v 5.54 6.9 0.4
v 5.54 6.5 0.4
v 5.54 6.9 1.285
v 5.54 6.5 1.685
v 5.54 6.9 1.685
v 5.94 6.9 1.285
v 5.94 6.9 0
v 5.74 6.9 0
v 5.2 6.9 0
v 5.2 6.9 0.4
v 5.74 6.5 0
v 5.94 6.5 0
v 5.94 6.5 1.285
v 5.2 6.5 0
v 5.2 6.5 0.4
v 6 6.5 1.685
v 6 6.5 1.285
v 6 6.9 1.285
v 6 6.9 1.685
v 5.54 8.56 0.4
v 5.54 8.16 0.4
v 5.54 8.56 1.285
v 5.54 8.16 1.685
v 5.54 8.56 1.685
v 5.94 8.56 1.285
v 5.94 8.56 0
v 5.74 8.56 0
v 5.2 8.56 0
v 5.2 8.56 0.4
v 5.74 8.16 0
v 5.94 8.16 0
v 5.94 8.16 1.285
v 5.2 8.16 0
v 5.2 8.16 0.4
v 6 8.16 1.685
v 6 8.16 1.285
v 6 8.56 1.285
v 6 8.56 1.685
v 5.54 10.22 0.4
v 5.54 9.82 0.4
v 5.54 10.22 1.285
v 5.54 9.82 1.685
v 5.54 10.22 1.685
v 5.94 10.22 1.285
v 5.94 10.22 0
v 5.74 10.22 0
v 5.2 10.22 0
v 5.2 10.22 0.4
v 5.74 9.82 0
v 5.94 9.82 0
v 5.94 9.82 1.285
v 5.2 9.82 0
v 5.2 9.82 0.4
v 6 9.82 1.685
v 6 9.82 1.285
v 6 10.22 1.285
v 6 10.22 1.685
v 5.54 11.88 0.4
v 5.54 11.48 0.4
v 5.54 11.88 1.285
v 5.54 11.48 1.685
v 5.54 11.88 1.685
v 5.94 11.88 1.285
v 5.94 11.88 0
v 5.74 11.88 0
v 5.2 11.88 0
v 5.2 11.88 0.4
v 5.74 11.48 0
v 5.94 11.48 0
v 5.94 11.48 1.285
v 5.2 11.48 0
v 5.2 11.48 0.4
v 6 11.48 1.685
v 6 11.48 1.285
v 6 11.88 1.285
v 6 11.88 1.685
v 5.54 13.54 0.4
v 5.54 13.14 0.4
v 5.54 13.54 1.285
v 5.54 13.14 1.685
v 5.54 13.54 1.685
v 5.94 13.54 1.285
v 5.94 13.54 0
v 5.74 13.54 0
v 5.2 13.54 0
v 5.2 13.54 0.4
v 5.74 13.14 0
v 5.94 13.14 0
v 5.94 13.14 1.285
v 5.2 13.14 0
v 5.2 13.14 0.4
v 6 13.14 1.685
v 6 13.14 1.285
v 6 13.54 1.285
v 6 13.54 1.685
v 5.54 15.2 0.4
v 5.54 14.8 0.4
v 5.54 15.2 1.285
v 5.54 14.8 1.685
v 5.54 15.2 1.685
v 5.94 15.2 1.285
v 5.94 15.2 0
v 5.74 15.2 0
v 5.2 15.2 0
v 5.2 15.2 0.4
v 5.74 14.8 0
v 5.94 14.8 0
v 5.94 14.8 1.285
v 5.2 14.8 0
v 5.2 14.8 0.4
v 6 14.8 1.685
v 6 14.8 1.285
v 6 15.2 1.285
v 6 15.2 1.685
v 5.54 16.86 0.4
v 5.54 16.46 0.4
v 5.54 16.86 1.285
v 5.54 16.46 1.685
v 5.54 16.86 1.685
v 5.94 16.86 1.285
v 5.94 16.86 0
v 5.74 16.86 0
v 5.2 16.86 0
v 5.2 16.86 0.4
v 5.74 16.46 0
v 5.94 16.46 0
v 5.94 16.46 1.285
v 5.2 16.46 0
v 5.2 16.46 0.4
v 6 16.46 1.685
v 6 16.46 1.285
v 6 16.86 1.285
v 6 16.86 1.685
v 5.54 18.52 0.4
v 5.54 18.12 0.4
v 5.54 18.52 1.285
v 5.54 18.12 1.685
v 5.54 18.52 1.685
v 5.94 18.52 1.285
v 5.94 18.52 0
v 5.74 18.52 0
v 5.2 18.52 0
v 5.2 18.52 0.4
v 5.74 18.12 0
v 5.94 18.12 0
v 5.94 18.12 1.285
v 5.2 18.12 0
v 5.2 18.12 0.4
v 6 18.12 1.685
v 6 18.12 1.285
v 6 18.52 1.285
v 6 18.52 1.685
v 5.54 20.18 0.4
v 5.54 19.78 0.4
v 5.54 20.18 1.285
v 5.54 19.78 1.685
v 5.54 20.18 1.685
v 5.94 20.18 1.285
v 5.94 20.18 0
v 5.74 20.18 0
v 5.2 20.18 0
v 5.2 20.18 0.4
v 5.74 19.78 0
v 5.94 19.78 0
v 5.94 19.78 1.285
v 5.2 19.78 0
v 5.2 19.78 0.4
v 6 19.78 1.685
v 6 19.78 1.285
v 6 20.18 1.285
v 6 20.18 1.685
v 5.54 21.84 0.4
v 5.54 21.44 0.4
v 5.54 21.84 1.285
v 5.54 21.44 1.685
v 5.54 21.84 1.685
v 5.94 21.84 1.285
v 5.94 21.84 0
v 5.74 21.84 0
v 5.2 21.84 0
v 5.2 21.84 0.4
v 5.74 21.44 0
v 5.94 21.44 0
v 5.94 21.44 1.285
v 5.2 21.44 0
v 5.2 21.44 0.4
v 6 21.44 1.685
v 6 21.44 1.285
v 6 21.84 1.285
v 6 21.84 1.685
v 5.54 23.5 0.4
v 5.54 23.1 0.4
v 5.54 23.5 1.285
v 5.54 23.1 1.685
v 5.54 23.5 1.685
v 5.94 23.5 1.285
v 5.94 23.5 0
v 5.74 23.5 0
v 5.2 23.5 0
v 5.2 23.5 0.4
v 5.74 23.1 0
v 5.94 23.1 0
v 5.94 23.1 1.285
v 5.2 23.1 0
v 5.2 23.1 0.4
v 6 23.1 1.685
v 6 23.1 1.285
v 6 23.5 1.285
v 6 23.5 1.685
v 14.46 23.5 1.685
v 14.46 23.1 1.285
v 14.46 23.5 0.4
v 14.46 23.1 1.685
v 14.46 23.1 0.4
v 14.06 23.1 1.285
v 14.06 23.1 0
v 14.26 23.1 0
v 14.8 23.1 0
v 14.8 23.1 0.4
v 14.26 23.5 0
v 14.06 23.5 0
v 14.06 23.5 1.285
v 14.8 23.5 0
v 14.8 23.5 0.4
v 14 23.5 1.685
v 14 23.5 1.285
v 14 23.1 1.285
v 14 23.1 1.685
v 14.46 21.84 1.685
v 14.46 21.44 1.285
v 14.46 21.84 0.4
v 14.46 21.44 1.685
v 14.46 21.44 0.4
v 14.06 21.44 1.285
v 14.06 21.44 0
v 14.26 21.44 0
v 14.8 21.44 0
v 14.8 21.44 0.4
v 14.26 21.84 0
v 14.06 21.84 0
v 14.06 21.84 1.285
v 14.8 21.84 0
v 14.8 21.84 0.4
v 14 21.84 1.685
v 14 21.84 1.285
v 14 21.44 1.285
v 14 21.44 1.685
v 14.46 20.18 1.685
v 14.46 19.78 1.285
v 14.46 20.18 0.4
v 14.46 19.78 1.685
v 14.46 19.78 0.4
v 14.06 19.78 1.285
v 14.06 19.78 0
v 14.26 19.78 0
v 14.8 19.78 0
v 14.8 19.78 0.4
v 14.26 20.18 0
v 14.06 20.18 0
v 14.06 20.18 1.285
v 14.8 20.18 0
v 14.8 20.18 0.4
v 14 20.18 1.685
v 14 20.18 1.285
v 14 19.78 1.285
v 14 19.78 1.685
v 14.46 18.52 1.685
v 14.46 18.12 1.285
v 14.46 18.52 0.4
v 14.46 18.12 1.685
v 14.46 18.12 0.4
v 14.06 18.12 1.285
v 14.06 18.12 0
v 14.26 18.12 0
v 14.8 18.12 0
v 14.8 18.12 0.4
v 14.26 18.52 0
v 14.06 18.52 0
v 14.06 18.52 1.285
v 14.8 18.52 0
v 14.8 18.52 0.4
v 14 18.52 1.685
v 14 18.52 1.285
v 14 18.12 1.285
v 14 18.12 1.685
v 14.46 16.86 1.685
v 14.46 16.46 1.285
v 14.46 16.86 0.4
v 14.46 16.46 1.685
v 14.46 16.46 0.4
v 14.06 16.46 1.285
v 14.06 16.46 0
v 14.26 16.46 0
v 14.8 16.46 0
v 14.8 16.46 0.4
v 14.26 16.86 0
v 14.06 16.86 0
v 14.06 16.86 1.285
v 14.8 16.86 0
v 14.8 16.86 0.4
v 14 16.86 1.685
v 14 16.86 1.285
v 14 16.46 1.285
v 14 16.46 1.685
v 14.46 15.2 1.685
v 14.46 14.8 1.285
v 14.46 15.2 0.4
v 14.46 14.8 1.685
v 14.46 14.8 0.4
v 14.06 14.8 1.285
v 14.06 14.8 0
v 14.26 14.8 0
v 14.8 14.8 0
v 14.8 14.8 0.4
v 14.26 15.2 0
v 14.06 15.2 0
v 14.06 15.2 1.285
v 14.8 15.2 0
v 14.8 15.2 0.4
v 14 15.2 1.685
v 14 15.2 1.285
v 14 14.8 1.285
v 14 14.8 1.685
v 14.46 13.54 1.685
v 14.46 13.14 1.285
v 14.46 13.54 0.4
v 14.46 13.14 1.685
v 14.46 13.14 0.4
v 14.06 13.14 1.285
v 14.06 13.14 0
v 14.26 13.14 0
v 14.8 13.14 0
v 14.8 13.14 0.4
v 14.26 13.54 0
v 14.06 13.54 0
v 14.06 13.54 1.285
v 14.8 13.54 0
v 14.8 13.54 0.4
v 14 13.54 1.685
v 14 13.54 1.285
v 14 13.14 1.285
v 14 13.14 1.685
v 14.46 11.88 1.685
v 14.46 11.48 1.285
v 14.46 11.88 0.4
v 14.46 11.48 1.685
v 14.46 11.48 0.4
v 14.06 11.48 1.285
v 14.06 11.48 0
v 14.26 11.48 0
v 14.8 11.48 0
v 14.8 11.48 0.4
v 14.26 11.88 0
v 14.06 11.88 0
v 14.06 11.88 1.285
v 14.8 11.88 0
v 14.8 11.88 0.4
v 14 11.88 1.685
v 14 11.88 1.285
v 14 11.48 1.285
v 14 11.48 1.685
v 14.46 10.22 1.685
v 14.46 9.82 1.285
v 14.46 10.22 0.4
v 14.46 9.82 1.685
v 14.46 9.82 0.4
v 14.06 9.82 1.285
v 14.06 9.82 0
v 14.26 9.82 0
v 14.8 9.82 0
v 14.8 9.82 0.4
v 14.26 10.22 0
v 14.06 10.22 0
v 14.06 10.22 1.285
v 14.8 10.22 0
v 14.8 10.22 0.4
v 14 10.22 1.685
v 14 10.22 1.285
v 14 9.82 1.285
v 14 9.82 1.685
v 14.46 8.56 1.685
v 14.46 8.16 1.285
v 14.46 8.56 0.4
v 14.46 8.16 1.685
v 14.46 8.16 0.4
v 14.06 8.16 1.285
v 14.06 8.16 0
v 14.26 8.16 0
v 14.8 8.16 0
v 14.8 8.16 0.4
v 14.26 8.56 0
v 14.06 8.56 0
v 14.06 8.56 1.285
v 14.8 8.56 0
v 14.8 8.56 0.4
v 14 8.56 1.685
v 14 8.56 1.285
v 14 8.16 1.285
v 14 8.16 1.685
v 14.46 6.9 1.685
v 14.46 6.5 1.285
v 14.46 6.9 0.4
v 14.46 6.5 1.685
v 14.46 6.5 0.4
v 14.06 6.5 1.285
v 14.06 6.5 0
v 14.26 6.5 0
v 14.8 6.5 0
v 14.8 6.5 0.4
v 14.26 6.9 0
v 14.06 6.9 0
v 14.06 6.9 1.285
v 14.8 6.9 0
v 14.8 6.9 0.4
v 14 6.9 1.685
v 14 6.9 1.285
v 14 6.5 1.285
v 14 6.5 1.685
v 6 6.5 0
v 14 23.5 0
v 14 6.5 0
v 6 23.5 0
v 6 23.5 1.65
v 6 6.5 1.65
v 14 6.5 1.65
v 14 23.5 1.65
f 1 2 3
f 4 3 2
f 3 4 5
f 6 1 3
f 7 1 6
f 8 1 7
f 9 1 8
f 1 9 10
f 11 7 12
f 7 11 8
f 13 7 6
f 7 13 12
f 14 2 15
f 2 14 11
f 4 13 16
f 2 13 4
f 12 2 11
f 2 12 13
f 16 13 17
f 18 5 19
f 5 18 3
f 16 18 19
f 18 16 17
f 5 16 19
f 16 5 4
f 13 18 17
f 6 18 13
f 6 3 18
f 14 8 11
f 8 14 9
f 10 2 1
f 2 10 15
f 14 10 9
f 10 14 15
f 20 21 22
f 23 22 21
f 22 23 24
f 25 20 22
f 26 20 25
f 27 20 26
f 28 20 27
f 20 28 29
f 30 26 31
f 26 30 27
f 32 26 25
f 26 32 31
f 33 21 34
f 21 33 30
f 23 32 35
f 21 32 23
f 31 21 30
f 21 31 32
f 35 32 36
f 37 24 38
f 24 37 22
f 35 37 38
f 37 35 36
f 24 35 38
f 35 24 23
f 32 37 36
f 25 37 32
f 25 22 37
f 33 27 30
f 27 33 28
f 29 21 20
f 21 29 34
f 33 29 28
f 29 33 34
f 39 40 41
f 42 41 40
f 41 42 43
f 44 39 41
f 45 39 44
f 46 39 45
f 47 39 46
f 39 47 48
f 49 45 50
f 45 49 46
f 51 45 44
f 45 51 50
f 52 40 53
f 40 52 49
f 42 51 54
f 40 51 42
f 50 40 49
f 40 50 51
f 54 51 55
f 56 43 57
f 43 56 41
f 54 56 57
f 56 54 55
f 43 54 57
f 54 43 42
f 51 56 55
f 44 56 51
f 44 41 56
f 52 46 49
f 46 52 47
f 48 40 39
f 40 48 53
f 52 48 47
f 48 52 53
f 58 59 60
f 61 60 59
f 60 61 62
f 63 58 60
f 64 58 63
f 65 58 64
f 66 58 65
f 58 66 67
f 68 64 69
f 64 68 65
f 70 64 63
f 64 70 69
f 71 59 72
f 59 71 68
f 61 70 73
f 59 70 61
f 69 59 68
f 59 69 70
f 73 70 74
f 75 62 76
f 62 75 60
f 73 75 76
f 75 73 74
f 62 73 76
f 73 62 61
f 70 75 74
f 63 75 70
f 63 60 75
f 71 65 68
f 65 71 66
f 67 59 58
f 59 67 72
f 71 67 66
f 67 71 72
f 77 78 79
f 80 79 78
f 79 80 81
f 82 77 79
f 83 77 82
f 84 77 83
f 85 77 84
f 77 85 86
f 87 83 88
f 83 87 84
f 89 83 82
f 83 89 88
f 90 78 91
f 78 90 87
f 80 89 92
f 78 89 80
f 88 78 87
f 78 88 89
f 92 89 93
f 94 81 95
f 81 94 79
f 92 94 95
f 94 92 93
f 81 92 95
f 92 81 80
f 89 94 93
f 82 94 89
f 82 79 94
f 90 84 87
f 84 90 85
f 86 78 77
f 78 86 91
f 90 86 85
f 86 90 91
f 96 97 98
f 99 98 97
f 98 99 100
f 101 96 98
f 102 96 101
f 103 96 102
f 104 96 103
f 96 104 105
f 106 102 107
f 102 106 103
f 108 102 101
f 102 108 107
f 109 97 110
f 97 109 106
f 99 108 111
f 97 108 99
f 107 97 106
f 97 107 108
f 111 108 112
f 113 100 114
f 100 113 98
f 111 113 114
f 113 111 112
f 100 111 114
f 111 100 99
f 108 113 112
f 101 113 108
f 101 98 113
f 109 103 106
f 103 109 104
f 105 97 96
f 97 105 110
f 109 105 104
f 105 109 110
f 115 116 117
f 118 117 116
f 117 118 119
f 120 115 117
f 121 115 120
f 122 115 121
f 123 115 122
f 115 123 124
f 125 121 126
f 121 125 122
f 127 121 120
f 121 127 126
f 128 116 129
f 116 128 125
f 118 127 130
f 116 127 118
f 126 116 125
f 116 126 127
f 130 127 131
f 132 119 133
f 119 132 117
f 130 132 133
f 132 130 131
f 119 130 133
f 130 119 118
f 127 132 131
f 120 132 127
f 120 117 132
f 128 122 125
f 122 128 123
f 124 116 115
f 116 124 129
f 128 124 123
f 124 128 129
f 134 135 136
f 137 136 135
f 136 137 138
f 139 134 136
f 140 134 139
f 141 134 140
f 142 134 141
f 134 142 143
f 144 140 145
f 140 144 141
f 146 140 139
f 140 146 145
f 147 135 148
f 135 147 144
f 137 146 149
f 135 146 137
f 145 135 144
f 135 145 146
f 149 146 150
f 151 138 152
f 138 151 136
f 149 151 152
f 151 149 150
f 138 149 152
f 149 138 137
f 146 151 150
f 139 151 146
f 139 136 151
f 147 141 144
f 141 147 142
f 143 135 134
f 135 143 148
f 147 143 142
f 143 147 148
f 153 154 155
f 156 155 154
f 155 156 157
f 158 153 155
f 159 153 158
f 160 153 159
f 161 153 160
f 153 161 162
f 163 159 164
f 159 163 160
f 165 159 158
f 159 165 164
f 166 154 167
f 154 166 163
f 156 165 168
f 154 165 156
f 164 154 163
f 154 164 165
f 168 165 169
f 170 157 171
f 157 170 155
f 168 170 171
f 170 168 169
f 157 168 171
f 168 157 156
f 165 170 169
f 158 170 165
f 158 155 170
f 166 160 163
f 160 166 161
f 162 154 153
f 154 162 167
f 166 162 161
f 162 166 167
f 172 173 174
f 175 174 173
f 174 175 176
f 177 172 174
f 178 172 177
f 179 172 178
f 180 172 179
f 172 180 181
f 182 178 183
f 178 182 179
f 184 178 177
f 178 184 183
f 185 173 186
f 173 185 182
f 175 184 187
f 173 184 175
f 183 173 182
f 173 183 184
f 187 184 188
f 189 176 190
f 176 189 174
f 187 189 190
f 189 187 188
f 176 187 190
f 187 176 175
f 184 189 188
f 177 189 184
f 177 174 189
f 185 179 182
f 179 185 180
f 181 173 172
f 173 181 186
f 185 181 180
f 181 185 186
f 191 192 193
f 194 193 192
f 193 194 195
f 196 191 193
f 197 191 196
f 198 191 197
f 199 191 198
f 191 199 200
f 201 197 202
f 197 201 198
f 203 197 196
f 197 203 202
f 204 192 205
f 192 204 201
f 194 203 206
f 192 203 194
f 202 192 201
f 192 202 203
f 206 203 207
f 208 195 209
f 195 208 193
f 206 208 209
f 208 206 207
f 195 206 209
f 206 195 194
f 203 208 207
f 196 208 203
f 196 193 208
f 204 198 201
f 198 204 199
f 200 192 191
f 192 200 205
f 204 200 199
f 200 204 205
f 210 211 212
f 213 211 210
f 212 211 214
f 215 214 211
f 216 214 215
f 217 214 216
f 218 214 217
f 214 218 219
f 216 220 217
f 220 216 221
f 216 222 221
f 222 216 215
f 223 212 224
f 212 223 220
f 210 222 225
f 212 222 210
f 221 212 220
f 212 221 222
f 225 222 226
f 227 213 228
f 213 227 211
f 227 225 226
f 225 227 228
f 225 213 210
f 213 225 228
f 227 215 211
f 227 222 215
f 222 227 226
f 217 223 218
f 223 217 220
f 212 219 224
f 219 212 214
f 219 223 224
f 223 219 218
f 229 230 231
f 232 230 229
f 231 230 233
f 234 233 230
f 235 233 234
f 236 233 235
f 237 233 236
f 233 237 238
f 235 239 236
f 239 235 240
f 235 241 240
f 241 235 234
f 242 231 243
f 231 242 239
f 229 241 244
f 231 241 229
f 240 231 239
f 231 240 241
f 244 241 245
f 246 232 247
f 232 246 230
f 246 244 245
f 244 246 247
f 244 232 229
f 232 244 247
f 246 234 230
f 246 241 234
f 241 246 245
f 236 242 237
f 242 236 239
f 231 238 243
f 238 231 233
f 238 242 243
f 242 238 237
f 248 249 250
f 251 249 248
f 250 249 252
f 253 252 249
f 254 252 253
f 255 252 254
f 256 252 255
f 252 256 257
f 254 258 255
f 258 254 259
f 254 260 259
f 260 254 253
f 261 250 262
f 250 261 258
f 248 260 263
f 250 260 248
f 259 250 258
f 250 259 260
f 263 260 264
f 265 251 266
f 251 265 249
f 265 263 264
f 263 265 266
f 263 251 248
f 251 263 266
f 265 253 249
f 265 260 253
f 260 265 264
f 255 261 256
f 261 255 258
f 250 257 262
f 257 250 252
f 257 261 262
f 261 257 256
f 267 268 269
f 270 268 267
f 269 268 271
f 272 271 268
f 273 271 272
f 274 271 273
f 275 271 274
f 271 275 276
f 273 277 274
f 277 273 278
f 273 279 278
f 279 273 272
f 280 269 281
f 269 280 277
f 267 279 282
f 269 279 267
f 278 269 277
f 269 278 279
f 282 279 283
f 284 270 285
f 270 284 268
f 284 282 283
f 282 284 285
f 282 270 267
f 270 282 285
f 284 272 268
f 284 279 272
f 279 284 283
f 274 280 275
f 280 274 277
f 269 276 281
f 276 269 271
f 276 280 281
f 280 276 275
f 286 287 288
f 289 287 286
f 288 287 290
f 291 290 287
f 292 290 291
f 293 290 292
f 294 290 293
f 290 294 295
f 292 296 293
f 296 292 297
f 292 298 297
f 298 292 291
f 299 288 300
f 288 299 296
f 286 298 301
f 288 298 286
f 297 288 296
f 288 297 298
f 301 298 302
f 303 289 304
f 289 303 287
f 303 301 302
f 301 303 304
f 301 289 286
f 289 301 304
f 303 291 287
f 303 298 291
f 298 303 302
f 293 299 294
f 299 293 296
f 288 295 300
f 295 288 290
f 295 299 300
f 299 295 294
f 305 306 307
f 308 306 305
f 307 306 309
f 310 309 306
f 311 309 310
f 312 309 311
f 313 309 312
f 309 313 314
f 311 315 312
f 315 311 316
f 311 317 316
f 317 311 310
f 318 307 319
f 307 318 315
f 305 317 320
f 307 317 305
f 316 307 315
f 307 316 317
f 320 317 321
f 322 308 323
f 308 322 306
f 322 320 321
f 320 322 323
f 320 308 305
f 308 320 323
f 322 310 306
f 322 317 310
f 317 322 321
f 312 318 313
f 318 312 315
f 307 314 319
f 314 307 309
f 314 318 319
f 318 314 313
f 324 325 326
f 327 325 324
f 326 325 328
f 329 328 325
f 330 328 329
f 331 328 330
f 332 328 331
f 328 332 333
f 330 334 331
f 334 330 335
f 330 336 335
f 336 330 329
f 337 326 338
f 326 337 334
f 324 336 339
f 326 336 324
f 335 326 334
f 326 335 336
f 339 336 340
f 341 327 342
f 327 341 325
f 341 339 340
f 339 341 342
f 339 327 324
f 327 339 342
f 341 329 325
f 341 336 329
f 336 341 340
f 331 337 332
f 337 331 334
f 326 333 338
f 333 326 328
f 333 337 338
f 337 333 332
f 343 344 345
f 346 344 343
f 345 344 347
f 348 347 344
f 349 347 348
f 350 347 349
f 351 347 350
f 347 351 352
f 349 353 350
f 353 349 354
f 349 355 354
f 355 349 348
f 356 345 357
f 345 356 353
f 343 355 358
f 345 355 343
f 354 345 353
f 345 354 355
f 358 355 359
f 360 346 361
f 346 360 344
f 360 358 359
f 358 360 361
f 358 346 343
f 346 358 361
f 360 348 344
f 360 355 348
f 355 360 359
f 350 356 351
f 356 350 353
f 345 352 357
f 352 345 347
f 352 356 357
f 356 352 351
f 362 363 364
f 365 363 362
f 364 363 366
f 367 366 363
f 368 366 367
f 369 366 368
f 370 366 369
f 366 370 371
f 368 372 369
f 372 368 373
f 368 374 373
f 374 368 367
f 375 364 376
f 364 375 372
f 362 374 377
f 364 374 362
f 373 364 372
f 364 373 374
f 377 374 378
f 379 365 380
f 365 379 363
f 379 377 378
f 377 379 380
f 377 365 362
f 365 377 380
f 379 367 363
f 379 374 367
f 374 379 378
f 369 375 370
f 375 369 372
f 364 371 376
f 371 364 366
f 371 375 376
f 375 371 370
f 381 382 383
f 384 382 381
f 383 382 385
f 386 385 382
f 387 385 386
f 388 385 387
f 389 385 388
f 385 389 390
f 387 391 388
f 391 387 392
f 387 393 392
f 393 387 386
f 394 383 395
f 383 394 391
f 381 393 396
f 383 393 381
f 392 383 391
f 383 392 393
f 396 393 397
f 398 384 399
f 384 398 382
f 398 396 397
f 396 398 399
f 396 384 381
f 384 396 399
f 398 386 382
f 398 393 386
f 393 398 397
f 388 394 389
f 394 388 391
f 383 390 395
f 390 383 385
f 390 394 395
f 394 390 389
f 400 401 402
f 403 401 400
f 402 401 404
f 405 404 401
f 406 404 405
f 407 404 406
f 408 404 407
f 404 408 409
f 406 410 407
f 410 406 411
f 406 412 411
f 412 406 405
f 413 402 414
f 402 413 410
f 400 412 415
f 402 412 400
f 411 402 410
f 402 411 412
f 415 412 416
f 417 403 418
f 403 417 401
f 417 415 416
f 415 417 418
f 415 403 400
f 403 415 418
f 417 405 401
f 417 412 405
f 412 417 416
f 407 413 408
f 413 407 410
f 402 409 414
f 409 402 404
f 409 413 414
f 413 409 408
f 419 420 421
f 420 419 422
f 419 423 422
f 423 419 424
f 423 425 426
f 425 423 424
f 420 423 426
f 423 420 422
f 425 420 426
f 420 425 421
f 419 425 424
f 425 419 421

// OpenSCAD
/**
  * Module: SMD Placeholder Renderer
  *
  * Author: Karim Aziiev <karim.aziiev@gmail.com>
  * License: GPL-3.0-or-later
  */

include <../colors.scad>
include <../parameters.scad>

use <../lib/functions.scad>
use <../lib/plist.scad>
use <../lib/text.scad>
use <../lib/transforms.scad>
use <../placeholders/pin_header.scad>
use <../placeholders/screw_terminal.scad>
use <../placeholders/smd/can_capacitor.scad>
use <../placeholders/smd/ceramic_capacitor.scad>
use <../placeholders/smd/power_inductor.scad>
use <../placeholders/smd/schottky_diode.scad>
use <../placeholders/smd/smd_chip.scad>
use <../placeholders/smd/smd_resistor.scad>

module smd_placeholder_renderer(plist,
                                cell_size,
                                align_x = -1,
                                align_y = -1,
                                thickness,
                                spin,
                                show_screw_terminal=true,
                                show_smd_resistor=true,
                                show_smd_chip=true,
                                show_shielded_power_inductor=true,
                                show_unshielded_power_inductor=true,
                                show_can_capacitor=true,
                                show_pin_header=true,
                                show_schottky_diode=true,
                                show_ceramic_capactior=true) {
  placeholder = plist_get("type", plist);
  cell_size = with_default(cell_size, []);
  placeholder_size = plist_get("placeholder_size", plist);
  spin = with_default(spin, 0);

  translate([0, 0, with_default(thickness, 0)]) {
    if (show_screw_terminal && placeholder == "screw_terminal") {
      let (base_x = screw_terminal_width_from_plist(plist),
           base_y = plist_get("thickness", plist, 7.6),
           placeholder_size=[base_x, base_y]) {
        align_children_with_spin(parent_size=cell_size,
                                 size=placeholder_size,
                                 align_x=align_x,
                                 align_y=align_y,
                                 spin=spin) {
          screw_terminal_from_plist(plist, center=false);
        }
      }
    } else if (show_can_capacitor && placeholder == "can_capacitor") {
      let (d = plist_get("d", plist)) {
        align_children(parent_size=cell_size,
                       size=[d, d],
                       align_x=align_x,
                       align_y=align_y) {
          can_capacitor_from_plist(plist, center=false);
        }
      }
    } else if (is_list(placeholder_size) && is_num(placeholder_size[0])) {
      align_children_with_spin(parent_size=cell_size,
                               size=placeholder_size,
                               align_x=align_x,
                               align_y=align_y,
                               spin=spin) {
        if (show_smd_resistor && placeholder == "smd_resistor") {
          smd_resistor_from_plist(plist, center=false);
        } else if (show_schottky_diode && placeholder == "schottky_diode") {
          schottky_diode(plist, center=false);
        } else if (show_ceramic_capactior
                   && placeholder == "ceramic_capactior") {
          ceramic_capactior(plist, center=false); {
        }
        } else if (show_smd_chip && placeholder == "smd_chip") {
          smd_chip_from_plist(plist, center=false);
        } else if (show_unshielded_power_inductor
                   && placeholder == "unshielded_power_inductor") {
          unshielded_power_inductor_from_plist(plist, center=false);
        } else if (show_shielded_power_inductor
                   && placeholder == "shielded_power_inductor") {
          shielded_power_inductor_from_plist(plist, center=false);
        }
      }
    } else if (placeholder == "text") {
      let (txt = plist_get("text", plist),
           tm = textmetrics(text=is_string(txt) ? txt : str(txt),
                            size=plist_get("size", plist),
                            font=plist_get("font", plist),
                            spacing=plist_get("spacing", plist),
                            halign=plist_get("halign", plist, "left"),
                            valign=plist_get("valign", plist, "baseline")),
           size = tm.size) {
        align_children_with_spin(parent_size=cell_size,
                                 size=size,
                                 align_x=align_x,
                                 align_y=align_y,
                                 spin=spin) {

          text_from_plist(txt=txt,
                          plist=plist,
                          default_valign="baseline",
                          default_halign="baselleft");
        }
      }
    } else if (show_pin_header && placeholder == "pin_header") {
      let (size = pin_header_size_from_plist(plist)) {
        align_children_with_spin(parent_size=cell_size,
                                 size=size,
                                 align_x=align_x,
                                 align_y=align_y,
                                 spin=spin) {
          pin_header_from_plist(plist, center=false);
        }
      }
    }
  }
}

module smd_placeholder_slot_renderer(plist,
                                     cell_size,
                                     align_x = -1,
                                     align_y = -1,
                                     thickness,
                                     spin,
                                     show_screw_terminal=true) {
  placeholder = plist_get("type", plist);
  cell_size = with_default(cell_size, []);
  spin = with_default(spin, 0);

  translate([0, 0, 0]) {
    if (show_screw_terminal && placeholder == "screw_terminal") {
      let (base_x = screw_terminal_width_from_plist(plist),
           base_y = plist_get("thickness", plist, 7.6),
           placeholder_size=[base_x, base_y]) {
        align_children_with_spin(parent_size=cell_size,
                                 size=placeholder_size,
                                 align_x=align_x,
                                 align_y=align_y,
                                 spin=spin) {
          screw_terminal_from_plist(plist,
                                    center=false,
                                    slot_mode=true,
                                    slot_thickness=thickness);
        }
      }
    }
  }
}

smd_placeholder_renderer(["type", "smd_chip",
                          "placeholder_size", [10, 17],
                          "corner_rad", 0.0,
                          "spin", 0,
                          "chip_size", [8, 17, 1.65],
                          "j_lead", [["count", 11,
                                      "thickness", 0.4,
                                      "sides", ["left", "right"]]]],
                         cell_size=[20, 30],
                         align_x=0,
                         align_y=0);
